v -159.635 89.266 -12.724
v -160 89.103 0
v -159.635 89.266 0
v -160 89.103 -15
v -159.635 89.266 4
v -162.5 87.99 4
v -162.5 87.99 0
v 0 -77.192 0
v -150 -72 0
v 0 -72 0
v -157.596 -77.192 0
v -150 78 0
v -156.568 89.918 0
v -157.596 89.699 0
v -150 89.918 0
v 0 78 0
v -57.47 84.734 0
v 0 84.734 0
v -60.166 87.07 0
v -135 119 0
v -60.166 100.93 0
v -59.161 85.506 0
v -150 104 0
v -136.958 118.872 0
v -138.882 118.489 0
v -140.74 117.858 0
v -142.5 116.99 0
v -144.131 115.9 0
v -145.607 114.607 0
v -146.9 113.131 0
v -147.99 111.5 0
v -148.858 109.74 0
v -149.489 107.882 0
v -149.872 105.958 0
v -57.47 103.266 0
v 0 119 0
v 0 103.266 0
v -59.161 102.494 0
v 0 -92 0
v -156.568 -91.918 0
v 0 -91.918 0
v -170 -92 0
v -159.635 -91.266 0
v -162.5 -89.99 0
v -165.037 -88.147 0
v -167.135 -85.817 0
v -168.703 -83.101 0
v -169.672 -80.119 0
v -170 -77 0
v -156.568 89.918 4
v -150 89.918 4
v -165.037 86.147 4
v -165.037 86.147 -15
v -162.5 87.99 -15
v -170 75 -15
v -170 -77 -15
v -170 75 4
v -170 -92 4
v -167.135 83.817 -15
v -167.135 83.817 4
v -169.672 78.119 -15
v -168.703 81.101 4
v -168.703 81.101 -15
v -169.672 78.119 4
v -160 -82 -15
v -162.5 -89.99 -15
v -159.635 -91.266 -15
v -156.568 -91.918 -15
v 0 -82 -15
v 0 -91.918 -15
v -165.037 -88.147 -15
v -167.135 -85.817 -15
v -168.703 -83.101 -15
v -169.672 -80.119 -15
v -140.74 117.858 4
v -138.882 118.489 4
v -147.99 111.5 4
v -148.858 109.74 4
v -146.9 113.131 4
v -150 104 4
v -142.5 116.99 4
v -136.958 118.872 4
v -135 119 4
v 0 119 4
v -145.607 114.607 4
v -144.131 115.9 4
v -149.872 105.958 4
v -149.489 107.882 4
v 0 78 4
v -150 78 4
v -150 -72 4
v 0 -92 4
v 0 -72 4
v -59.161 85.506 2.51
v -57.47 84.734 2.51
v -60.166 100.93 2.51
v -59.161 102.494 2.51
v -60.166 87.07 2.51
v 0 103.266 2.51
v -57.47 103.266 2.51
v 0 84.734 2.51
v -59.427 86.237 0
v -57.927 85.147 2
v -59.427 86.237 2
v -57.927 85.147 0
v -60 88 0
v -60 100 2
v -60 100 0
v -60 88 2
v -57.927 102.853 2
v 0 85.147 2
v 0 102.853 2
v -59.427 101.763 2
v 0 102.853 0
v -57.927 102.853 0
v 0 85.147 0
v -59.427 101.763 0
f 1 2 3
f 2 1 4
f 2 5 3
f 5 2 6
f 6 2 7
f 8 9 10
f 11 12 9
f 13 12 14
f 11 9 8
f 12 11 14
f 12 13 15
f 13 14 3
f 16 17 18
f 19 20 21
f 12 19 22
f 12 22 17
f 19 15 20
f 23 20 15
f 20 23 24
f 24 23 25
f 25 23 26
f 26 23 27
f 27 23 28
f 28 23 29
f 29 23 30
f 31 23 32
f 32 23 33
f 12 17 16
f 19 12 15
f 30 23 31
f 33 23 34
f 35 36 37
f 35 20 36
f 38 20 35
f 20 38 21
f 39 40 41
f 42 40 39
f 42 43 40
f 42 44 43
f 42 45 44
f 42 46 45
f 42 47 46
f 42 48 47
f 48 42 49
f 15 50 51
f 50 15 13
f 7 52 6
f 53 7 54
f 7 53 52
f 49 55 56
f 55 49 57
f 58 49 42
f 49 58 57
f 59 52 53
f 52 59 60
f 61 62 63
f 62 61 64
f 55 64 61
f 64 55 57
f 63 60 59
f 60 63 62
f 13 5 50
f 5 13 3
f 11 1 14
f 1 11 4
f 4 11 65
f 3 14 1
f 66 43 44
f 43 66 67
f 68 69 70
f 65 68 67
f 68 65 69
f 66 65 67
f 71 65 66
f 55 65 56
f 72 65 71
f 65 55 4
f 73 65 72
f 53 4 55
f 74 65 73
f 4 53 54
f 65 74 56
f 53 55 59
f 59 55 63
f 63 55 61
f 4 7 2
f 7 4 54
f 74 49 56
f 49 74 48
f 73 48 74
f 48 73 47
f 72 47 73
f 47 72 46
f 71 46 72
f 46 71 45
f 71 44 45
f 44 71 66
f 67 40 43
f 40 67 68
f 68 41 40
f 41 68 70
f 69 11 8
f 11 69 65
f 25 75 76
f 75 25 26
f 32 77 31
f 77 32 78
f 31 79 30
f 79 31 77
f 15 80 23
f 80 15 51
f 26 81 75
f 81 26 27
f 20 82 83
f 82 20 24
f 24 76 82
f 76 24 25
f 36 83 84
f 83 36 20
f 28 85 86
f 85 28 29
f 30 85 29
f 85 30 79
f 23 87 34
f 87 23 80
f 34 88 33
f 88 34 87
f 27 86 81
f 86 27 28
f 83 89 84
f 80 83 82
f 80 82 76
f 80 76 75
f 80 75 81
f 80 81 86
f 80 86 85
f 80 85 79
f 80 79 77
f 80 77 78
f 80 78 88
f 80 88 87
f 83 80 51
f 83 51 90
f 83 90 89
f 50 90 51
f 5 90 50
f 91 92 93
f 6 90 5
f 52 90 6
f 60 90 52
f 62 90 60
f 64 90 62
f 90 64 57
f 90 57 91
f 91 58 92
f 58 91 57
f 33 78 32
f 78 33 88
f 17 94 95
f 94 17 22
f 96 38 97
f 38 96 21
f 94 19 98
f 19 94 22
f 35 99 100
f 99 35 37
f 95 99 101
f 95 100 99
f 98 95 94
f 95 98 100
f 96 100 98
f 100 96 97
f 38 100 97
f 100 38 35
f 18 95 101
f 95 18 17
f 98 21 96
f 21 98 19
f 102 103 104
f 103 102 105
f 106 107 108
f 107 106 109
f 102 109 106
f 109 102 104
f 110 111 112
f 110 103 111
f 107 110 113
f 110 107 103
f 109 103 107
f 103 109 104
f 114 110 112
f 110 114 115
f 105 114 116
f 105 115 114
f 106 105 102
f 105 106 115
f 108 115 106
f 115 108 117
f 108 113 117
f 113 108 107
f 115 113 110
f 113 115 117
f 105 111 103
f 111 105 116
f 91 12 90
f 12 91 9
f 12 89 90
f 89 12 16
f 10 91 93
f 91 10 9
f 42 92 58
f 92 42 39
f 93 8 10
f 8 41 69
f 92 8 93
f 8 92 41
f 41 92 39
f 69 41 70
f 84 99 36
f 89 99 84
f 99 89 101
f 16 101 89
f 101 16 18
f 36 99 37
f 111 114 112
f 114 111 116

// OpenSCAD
// file: ../../lib/project/util.scad
// lib/project/util.scad

module rounded_rect_2d(size = [10, 10], r = 2) {
  x = size[0];
  y = size[1];
  rr = min(r, min(x, y) / 2);

  hull() {
    for (sx = [-1, 1], sy = [-1, 1]) {
      translate([sx * (x / 2 - rr), sy * (y / 2 - rr)])
        circle(r = rr);
    }
  }
}
// file: ../../lib/project/params.scad
// lib/project/params.scad
// Shared project parameters for the final tray and all fit-test models.

debug = false;

// Main tray footprint.
tray_corner_r = 15;

// Top tray shell.
tray_floor_t = 2.4;
tray_wall_h = 14;
top_wall_w = 10;
rim_inner_taper = 4.0;
glue_rabbet_h = 1.6;
glue_rabbet_w = 3.2;
glue_rabbet_side_clearance = 0.3;
glue_rabbet_vertical_clearance = 0.5;

// Underside support lip and rear support section.
support_lip_drop = 15;
support_lip_w = 10;
front_lip_forward_shift = 2;
front_lip_back_extra = 5;
front_lip_bottom_back_extra = 0;
side_lip_inner_extra = 2.5;
side_lip_bottom_inner_extra = 0;
console_clear_w = 320;
side_lip_run = 170;
tray_w = console_clear_w + 2 * support_lip_w;
tray_d = side_lip_run + support_lip_w;
front_extension = 45;
rear_gap_w = 28;
rear_tongue_side_margin = 20;
rear_tongue_w = tray_w - 2 * rear_tongue_side_margin;
rear_tongue_depth = 29;
rear_tongue_t = 4.0;

// Cup holder location and plug geometry.
cup_spacing = 135;
// Confirmed from fit checks: move plugs 39 mm rearward from the prior position.
cup_y_from_front = 111;
plug_top_d = 90;
plug_bottom_d = 78;
plug_h = 71;
plug_shell_t = 1.6;
plug_clearance_z = 0;
cup_rim_w = 7;
cup_rim_h = 5;

// Optional underside splice plate for joining printed tray halves.
splice_plate_enable = true;
splice_plate_w = 120;
splice_plate_d = 18;
splice_plate_t = 2;
splice_plate_corner_r = 3;
splice_plate_y_from_front = 40;
splice_plate_side_clearance = 0.3;
splice_plate_vertical_clearance = 0.5;
rear_splice_plate_enable = true;
rear_splice_plate_y_from_front = 184;

// Fit-test defaults.
test_plug_top_ds = [84, 85, 86];
test_spacing_values = [116, 118, 120];
test_lip_drop_values = [8, 10, 12];
test_rear_tongue_ts = [1.4, 1.8, 2.2];
test_frame_wall_w = 12;
test_front_zone_depth = 100;
test_rear_zone_depth = 56;
test_gap_section_w = 140;
test_coupon_spacing = 18;
test_front_to_back_slice_w = 10;
test_side_to_side_slice_w = 10;
test_rabbet_corner_section_size = 56;
test_rabbet_coupon_gap = 16;
test_rabbet_body_margin_from_groove = 15;
// main file
use <../../lib/project/console_tray.scad>;
include <../../lib/project/params.scad>;

// Set false to export the opposite half without changing shared geometry.
keep_left_half = true;

half_perimeter_frame_variant(
  tray_w = tray_w,
  tray_d = tray_d,
  front_extension = front_extension,
  tray_corner_r = tray_corner_r,
  frame_wall_w = test_frame_wall_w,
  tray_floor_t = tray_floor_t,
  tray_wall_h = tray_wall_h,
  top_wall_w = top_wall_w,
  rim_inner_taper = rim_inner_taper,
  glue_rabbet_h = glue_rabbet_h,
  glue_rabbet_w = glue_rabbet_w,
  glue_rabbet_side_clearance = glue_rabbet_side_clearance,
  glue_rabbet_vertical_clearance = glue_rabbet_vertical_clearance,
  support_lip_drop = support_lip_drop,
  support_lip_w = support_lip_w,
  front_lip_forward_shift = front_lip_forward_shift,
  front_lip_back_extra = front_lip_back_extra,
  front_lip_bottom_back_extra = front_lip_bottom_back_extra,
  side_lip_inner_extra = side_lip_inner_extra,
  side_lip_bottom_inner_extra = side_lip_bottom_inner_extra,
  rear_gap_w = rear_gap_w,
  rear_tongue_w = rear_tongue_w,
  rear_tongue_depth = rear_tongue_depth,
  rear_tongue_t = rear_tongue_t,
  cup_spacing = cup_spacing,
  cup_y_from_front = cup_y_from_front,
  plug_top_d = plug_top_d,
  plug_bottom_d = plug_bottom_d,
  plug_h = plug_h,
  plug_shell_t = plug_shell_t,
  cup_rim_w = cup_rim_w,
  cup_rim_h = cup_rim_h,
  splice_plate_enable = splice_plate_enable,
  splice_plate_w = splice_plate_w,
  splice_plate_d = splice_plate_d,
  splice_plate_t = splice_plate_t,
  splice_plate_corner_r = splice_plate_corner_r,
  splice_plate_y_from_front = splice_plate_y_from_front,
  splice_plate_side_clearance = splice_plate_side_clearance,
  splice_plate_vertical_clearance = splice_plate_vertical_clearance,
  rear_splice_plate_enable = rear_splice_plate_enable,
  rear_splice_plate_y_from_front = rear_splice_plate_y_from_front,
  plug_clearance_z = plug_clearance_z,
  debug = debug,
  keep_left_half = keep_left_half
);
